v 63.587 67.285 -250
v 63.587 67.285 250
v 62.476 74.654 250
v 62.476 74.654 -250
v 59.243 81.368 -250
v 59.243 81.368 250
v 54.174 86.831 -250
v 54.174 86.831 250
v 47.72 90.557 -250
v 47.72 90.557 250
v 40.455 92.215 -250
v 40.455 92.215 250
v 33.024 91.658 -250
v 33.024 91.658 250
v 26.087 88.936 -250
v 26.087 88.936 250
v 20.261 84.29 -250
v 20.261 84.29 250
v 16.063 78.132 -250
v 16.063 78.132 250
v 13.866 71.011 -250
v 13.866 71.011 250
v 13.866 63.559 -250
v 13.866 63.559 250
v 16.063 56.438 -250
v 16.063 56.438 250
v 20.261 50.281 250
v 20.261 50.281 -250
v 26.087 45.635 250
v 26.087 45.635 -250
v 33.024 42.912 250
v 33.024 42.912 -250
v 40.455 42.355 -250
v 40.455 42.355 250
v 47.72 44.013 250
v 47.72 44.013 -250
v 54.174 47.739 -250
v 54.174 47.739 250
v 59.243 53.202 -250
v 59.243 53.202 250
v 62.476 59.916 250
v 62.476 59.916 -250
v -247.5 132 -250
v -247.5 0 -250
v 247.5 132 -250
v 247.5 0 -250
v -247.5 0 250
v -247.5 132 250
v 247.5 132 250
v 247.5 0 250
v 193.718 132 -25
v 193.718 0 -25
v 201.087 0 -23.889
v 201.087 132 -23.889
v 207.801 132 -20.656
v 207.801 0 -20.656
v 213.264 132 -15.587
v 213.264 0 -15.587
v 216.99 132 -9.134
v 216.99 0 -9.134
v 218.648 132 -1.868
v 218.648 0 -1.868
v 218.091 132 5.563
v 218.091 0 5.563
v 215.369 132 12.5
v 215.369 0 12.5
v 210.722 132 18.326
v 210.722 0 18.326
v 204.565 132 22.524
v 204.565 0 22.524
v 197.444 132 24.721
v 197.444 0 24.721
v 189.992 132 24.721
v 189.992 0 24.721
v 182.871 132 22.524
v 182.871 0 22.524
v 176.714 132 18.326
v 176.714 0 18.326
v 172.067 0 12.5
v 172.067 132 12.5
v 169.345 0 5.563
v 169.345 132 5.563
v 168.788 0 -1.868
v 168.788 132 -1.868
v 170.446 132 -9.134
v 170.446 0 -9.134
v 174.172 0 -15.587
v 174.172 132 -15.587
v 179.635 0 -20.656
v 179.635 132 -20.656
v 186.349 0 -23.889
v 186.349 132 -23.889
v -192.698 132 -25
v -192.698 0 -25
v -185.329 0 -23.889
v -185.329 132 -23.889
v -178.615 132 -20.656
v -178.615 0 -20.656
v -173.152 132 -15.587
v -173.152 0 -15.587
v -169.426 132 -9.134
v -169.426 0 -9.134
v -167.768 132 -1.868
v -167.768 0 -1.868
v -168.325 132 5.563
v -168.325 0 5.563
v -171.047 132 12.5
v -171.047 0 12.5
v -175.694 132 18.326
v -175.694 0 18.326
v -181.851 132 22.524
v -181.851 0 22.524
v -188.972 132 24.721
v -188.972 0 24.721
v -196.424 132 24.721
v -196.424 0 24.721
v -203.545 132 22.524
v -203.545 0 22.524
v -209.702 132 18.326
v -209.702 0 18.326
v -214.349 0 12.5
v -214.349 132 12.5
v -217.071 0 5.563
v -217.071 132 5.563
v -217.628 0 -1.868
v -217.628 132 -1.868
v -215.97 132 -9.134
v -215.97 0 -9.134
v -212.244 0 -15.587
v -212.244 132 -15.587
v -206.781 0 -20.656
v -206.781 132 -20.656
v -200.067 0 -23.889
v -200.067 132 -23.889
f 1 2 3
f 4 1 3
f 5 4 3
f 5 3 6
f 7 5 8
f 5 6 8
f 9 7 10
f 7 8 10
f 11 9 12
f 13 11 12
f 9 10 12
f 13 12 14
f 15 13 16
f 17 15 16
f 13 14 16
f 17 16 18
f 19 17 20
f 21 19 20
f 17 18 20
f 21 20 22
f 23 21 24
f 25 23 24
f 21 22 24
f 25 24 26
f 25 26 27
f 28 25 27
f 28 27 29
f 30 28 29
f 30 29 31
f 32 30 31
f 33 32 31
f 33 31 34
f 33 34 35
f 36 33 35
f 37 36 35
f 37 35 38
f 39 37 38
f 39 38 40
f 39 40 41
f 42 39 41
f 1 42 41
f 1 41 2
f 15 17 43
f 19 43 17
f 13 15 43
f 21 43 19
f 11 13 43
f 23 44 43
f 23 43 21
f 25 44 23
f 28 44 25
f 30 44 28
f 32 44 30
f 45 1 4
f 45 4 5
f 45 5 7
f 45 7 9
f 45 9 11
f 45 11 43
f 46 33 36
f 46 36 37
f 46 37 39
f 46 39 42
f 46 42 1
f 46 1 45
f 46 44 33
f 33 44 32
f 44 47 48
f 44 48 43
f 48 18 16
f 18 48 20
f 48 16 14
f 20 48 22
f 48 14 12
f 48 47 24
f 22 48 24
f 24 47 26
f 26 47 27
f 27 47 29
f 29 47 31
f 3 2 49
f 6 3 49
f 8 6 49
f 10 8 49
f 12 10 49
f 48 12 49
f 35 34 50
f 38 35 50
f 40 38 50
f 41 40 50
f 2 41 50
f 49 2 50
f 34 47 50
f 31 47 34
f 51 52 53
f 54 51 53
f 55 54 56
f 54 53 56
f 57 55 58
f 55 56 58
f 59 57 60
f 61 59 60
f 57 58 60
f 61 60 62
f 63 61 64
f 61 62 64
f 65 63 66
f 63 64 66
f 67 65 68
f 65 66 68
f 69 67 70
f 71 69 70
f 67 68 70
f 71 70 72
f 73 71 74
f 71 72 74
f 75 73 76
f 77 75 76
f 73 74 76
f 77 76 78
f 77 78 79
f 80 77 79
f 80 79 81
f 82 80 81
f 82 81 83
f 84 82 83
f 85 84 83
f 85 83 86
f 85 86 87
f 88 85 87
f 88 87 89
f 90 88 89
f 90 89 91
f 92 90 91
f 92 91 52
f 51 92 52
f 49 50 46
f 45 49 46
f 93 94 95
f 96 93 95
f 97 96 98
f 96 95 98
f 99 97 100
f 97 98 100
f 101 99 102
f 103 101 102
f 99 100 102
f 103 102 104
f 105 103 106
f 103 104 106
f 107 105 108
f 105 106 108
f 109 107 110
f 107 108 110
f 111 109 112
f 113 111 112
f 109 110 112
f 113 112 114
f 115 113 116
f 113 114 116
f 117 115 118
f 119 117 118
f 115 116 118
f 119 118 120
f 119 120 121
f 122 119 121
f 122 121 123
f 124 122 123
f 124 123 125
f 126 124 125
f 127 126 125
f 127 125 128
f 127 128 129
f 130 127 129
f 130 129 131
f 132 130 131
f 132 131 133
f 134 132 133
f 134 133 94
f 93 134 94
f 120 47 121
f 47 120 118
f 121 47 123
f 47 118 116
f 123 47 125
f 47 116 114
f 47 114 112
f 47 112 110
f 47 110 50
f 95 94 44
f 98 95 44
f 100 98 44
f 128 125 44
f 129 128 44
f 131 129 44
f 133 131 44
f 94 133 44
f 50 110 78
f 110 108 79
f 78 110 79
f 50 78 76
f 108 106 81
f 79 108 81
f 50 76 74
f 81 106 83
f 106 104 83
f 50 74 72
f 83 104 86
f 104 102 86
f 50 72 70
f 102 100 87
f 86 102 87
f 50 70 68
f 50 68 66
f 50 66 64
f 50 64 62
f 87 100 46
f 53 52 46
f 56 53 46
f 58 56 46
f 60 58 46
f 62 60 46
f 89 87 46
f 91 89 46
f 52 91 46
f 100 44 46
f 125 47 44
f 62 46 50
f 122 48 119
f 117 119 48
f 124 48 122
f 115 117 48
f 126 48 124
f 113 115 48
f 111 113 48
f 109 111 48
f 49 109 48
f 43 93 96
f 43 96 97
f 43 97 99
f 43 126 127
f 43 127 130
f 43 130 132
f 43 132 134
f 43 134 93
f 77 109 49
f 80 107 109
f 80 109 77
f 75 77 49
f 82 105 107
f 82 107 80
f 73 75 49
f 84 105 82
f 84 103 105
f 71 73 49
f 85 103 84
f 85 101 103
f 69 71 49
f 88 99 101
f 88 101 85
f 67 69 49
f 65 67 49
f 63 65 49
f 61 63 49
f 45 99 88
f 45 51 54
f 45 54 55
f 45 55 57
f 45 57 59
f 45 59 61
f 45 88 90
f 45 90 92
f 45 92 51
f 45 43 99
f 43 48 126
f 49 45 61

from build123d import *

# Parameters (mm, degrees)
SKETCH2_W        = 495
SKETCH2_H        = 500
HIPS_DEPTH       = 132
SKETCH3_R        = 25
FEMUR_HOLE_DEPTH = 574.306418942
SKETCH4_R        = 25
TAIL_HOLE_DEPTH  = 376.739603981
SKETCH5_R        = 25
NECK_HOLE_DEPTH  = 376.739603981


with BuildPart() as part:
    # Sketch2 → Hips (new body)
    with BuildSketch(Plane(origin=(0, 0, 0), x_dir=(1, 0, 0), z_dir=(0, 1, 0))):
        Rectangle(SKETCH2_W, SKETCH2_H)
    extrude(amount=HIPS_DEPTH)

    # Sketch3 → Femur-hole (cut, through all)
    with BuildSketch(Plane.XY.offset(250)):
        with Locations((38.58686963, 67.285203145)):
            Circle(SKETCH3_R)
    extrude(amount=-FEMUR_HOLE_DEPTH, mode=Mode.SUBTRACT)

    # Sketch4 → Tail-hole (cut, through all)
    with BuildSketch(Plane.XZ):
        with Locations(Location((193.717960243, 0, 0), (0, 0, 270))):
            Circle(SKETCH4_R)
    extrude(amount=-TAIL_HOLE_DEPTH, mode=Mode.SUBTRACT)

    # Sketch5 → Neck-hole (cut, through all)
    with BuildSketch(Plane.XZ):
        with Locations(Location((-192.698108673, 0, 0), (0, 0, 270))):
            Circle(SKETCH5_R)
    extrude(amount=-NECK_HOLE_DEPTH, mode=Mode.SUBTRACT)


solid = part.part
